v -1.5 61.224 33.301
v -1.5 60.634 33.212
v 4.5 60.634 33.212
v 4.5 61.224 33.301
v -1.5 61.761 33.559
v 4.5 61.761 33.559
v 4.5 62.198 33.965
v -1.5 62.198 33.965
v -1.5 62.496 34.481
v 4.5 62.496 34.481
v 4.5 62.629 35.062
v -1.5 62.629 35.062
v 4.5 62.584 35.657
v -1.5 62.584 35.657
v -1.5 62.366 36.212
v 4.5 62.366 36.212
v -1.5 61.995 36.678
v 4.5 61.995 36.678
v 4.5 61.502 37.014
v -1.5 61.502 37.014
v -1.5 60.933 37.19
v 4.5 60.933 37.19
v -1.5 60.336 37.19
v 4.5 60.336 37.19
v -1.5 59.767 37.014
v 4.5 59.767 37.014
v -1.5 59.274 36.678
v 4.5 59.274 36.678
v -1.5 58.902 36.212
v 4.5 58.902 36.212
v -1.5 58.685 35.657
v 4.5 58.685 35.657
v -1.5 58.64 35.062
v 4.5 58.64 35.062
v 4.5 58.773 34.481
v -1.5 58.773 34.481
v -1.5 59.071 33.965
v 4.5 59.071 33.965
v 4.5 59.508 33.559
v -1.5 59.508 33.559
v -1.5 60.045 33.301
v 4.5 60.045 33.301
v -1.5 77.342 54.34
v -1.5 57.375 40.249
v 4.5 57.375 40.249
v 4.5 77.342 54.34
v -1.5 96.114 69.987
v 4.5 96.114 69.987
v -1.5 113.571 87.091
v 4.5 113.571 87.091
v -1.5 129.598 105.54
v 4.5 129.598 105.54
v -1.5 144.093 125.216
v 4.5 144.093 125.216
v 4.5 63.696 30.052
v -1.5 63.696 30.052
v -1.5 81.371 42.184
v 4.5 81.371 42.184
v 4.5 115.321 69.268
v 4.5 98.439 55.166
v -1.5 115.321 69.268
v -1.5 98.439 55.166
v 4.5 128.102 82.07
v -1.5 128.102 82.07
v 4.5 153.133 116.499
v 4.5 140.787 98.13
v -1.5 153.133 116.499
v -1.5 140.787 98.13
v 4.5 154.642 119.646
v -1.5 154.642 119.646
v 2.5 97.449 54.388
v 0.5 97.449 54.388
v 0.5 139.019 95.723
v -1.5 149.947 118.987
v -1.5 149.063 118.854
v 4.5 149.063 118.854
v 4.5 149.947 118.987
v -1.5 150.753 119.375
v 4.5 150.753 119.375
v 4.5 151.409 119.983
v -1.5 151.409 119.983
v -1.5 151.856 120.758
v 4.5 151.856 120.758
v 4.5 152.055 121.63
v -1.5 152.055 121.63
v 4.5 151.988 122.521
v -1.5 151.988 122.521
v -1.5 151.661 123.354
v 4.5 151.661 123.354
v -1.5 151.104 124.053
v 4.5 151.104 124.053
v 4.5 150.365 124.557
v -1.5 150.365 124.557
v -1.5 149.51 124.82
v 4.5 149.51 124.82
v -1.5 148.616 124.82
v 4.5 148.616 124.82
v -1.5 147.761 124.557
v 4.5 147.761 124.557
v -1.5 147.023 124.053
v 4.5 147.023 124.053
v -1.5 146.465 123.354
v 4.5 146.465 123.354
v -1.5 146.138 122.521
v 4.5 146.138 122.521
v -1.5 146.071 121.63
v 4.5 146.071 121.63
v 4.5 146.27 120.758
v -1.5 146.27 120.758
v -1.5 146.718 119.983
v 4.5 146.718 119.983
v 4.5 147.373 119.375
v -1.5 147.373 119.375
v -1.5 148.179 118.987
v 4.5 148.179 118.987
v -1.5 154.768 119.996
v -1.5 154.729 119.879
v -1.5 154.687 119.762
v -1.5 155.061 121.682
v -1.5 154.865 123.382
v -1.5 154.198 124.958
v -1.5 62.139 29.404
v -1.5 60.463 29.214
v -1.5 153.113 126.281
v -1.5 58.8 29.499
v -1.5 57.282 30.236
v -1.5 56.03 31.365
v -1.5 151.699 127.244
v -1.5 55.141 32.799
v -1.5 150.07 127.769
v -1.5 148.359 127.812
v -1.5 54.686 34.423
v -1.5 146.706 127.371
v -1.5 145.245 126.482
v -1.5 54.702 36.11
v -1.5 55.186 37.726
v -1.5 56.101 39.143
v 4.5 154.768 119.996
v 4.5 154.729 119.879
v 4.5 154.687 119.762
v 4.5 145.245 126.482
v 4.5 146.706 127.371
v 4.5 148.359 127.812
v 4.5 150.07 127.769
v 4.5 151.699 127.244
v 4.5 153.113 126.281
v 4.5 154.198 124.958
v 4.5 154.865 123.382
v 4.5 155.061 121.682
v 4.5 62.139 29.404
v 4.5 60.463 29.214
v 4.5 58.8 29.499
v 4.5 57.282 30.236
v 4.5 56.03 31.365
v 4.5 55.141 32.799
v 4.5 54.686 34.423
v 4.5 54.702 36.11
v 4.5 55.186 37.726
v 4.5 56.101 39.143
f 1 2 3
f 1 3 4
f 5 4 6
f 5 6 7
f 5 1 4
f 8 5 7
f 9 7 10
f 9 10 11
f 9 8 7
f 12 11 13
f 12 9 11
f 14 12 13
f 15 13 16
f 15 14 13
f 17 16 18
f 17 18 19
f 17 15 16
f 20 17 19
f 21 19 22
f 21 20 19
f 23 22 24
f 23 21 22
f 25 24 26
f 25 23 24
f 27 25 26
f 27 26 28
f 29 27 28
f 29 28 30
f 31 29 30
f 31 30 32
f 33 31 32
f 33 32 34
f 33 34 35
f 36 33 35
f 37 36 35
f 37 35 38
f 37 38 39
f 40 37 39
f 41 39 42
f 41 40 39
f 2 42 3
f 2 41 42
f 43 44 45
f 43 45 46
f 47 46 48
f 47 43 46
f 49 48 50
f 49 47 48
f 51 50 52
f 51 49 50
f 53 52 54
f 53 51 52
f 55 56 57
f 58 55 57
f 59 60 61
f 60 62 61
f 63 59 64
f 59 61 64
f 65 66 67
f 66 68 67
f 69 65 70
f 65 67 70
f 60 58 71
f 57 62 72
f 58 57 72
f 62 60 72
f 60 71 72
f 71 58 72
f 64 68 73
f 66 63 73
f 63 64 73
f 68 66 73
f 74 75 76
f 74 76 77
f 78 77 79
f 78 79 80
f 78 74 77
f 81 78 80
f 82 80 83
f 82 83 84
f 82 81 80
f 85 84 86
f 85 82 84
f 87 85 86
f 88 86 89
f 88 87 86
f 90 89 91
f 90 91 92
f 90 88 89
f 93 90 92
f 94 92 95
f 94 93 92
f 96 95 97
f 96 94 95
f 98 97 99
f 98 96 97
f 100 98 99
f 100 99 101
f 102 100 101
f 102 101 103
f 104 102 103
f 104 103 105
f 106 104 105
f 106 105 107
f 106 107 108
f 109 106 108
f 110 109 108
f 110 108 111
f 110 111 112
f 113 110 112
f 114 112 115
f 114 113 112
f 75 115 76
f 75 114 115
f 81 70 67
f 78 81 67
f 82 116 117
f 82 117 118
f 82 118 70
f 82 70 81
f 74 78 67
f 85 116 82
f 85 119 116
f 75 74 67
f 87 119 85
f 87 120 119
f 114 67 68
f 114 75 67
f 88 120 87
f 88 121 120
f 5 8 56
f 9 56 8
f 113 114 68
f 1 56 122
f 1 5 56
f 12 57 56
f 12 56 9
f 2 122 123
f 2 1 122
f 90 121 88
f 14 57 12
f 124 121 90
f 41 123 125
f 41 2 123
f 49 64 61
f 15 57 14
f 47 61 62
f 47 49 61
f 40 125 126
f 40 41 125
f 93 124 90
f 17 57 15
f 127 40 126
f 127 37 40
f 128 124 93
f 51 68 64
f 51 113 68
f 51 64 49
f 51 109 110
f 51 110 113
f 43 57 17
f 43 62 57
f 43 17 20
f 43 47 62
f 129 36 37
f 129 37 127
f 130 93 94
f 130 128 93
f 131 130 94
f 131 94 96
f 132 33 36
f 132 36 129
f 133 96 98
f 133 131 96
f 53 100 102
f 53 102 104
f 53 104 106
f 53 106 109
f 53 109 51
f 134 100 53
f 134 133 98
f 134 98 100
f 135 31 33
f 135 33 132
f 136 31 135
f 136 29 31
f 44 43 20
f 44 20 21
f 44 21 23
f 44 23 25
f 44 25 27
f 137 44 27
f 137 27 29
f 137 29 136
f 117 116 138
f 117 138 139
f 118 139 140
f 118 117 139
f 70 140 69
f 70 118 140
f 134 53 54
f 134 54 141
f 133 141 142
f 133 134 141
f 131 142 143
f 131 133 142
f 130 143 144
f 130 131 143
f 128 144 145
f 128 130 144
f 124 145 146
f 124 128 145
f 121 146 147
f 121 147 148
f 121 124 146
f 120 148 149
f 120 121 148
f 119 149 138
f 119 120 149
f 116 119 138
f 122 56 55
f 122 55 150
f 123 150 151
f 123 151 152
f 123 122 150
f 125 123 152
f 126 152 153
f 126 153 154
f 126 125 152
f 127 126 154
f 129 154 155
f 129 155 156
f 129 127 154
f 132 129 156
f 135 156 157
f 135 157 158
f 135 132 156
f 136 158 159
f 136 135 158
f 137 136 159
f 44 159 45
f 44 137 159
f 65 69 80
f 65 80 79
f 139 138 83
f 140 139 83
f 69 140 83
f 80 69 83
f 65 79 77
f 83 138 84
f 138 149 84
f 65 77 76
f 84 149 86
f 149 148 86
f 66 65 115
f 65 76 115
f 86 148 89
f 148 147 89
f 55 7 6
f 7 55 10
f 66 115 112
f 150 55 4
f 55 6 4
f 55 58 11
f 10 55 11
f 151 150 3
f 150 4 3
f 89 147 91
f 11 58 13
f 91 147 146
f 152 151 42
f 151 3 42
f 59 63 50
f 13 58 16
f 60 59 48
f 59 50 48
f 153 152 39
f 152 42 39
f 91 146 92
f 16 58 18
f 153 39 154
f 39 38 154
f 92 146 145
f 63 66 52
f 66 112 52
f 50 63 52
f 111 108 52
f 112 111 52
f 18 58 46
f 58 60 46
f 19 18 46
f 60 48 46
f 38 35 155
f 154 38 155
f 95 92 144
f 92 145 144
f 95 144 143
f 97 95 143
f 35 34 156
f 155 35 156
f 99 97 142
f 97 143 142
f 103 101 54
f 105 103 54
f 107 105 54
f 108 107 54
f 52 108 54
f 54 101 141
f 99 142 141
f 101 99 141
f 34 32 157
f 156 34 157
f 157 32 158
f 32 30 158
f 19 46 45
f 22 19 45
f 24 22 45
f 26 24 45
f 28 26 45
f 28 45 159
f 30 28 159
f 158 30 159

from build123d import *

# Parameters (mm, degrees)
SKETCH3_R               = 1
SKETCH3_R_2             = 1.5
BOSS_EXTRUDE3_DEPTH     = 3
SCALE1_SCALE            = 2
CUT_EXTRUDE1_DEPTH      = 221.773250552
CUT_EXTRUDE1_DEPTH_BACK = 221.773250552


with BuildPart() as part:
    # Sketch3 → Boss-Extrude3 (new body)
    with BuildSketch(Plane.YZ):
        with BuildLine():
            ThreePointArc((85.286443942, 65.55056259), (103.116861263, 80.165410908), (118.092599751, 97.693811573))
            ThreePointArc((118.092599751, 97.693811573), (133.598383509, 107.27552243), (130.534429587, 89.307475813))
            ThreePointArc((130.534429587, 89.307475813), (113.614659803, 69.451110846), (93.417083732, 52.940152059))
            ThreePointArc((93.417083732, 52.940152059), (75.390242246, 50.243580365), (85.286443942, 65.55056259))
        make_face()
        with Locations(Location((83.794759513, 55.662444591, 0), (0, 0, 270))):
            Circle(SKETCH3_R, mode=Mode.SUBTRACT)
        with Locations(Location((128.009104434, 98.9833599, 0), (0, 0, 270))):
            Circle(SKETCH3_R_2, mode=Mode.SUBTRACT)
    extrude(amount=BOSS_EXTRUDE3_DEPTH)


with BuildPart() as part_1:
    # Scale1: scaled about (1.5, 106.955102549, 76.112942123)
    add(part.part.scale(SCALE1_SCALE).moved(Location((-1.5, -106.955102549, -76.112942123))))

    # Sketch4 → Cut-Extrude1 (cut, two sides: drawn at the far end of the back side and taken through both)
    # profile 1 of 2: a face of its own
    with BuildSketch(Plane.YZ.offset(4.5).offset(-CUT_EXTRUDE1_DEPTH_BACK)):
        with BuildLine():
            ThreePointArc((88.183726829, 23.336110281), (127.272749417, 55.646412862), (160.374162964, 94.067810039))
            ThreePointArc((160.374162964, 94.067810039), (165.982617362, 146.627355256), (119.06613126, 122.279790983))
            ThreePointArc((119.06613126, 122.279790983), (92.280087616, 91.3607464), (60.820757061, 65.211368339))
            ThreePointArc((60.820757061, 65.211368339), (35.520657449, 18.801611674), (88.183726829, 23.336110281))
        make_face()
        with BuildLine():
            ThreePointArc((129.230096954, 119.274681024), (99.278619977, 84.217879693), (63.617785336, 54.988183056))
            ThreePointArc((63.617785336, 54.988183056), (43.825381943, 24.374218606), (79.879064915, 29.767361994))
            ThreePointArc((79.879064915, 29.767361994), (120.274217057, 62.78927957), (154.113756626, 102.502009503))
            ThreePointArc((154.113756626, 102.502009503), (160.241664469, 138.438102737), (129.230096954, 119.274681024))
        make_face(mode=Mode.SUBTRACT)
    # profile 2 of 2: a face of its own
    with BuildSketch(Plane.YZ.offset(4.5).offset(-CUT_EXTRUDE1_DEPTH_BACK)):
        with BuildLine():
            ThreePointArc((154.113756626, 102.502009503), (160.241664469, 138.438102737), (129.230096954, 119.274681024))
            ThreePointArc((129.230096954, 119.274681024), (99.278619977, 84.217879693), (63.617785336, 54.988183056))
            ThreePointArc((63.617785336, 54.988183056), (43.825381943, 24.374218606), (79.879064915, 29.767361994))
            ThreePointArc((79.879064915, 29.767361994), (120.274217057, 62.78927957), (154.113756626, 102.502009503))
        make_face()
        with BuildLine():
            ThreePointArc((63.695966872, 30.051820201), (55.534775112, 32.050672324), (57.374611965, 40.249175913))
            ThreePointArc((57.374611965, 40.249175913), (105.014353395, 78.363855281), (144.093462371, 125.215717449))
            ThreePointArc((144.093462371, 125.215717449), (151.698622928, 127.243958769), (154.768335401, 119.996262907))
            ThreePointArc((154.768335401, 119.996262907), (154.707974363, 119.820193462), (154.642181096, 119.646080998))
            add(Edge.make_bspline(
                [(63.695966872, 30.051820201), (71.268804507, 34.544853938), (116.169708626, 67.672774066), (134.037170487, 87.763772771), (153.494381638, 116.0792592), (154.642181096, 119.646080998)],
                knots=[0, 0, 0, 0, 0.217779275, 0.657591192, 0.944552217, 0.944552217, 0.944552217, 0.944552217], degree=3))
        make_face(mode=Mode.SUBTRACT)
    extrude(amount=CUT_EXTRUDE1_DEPTH + CUT_EXTRUDE1_DEPTH_BACK, mode=Mode.SUBTRACT)


solid = part_1.part
